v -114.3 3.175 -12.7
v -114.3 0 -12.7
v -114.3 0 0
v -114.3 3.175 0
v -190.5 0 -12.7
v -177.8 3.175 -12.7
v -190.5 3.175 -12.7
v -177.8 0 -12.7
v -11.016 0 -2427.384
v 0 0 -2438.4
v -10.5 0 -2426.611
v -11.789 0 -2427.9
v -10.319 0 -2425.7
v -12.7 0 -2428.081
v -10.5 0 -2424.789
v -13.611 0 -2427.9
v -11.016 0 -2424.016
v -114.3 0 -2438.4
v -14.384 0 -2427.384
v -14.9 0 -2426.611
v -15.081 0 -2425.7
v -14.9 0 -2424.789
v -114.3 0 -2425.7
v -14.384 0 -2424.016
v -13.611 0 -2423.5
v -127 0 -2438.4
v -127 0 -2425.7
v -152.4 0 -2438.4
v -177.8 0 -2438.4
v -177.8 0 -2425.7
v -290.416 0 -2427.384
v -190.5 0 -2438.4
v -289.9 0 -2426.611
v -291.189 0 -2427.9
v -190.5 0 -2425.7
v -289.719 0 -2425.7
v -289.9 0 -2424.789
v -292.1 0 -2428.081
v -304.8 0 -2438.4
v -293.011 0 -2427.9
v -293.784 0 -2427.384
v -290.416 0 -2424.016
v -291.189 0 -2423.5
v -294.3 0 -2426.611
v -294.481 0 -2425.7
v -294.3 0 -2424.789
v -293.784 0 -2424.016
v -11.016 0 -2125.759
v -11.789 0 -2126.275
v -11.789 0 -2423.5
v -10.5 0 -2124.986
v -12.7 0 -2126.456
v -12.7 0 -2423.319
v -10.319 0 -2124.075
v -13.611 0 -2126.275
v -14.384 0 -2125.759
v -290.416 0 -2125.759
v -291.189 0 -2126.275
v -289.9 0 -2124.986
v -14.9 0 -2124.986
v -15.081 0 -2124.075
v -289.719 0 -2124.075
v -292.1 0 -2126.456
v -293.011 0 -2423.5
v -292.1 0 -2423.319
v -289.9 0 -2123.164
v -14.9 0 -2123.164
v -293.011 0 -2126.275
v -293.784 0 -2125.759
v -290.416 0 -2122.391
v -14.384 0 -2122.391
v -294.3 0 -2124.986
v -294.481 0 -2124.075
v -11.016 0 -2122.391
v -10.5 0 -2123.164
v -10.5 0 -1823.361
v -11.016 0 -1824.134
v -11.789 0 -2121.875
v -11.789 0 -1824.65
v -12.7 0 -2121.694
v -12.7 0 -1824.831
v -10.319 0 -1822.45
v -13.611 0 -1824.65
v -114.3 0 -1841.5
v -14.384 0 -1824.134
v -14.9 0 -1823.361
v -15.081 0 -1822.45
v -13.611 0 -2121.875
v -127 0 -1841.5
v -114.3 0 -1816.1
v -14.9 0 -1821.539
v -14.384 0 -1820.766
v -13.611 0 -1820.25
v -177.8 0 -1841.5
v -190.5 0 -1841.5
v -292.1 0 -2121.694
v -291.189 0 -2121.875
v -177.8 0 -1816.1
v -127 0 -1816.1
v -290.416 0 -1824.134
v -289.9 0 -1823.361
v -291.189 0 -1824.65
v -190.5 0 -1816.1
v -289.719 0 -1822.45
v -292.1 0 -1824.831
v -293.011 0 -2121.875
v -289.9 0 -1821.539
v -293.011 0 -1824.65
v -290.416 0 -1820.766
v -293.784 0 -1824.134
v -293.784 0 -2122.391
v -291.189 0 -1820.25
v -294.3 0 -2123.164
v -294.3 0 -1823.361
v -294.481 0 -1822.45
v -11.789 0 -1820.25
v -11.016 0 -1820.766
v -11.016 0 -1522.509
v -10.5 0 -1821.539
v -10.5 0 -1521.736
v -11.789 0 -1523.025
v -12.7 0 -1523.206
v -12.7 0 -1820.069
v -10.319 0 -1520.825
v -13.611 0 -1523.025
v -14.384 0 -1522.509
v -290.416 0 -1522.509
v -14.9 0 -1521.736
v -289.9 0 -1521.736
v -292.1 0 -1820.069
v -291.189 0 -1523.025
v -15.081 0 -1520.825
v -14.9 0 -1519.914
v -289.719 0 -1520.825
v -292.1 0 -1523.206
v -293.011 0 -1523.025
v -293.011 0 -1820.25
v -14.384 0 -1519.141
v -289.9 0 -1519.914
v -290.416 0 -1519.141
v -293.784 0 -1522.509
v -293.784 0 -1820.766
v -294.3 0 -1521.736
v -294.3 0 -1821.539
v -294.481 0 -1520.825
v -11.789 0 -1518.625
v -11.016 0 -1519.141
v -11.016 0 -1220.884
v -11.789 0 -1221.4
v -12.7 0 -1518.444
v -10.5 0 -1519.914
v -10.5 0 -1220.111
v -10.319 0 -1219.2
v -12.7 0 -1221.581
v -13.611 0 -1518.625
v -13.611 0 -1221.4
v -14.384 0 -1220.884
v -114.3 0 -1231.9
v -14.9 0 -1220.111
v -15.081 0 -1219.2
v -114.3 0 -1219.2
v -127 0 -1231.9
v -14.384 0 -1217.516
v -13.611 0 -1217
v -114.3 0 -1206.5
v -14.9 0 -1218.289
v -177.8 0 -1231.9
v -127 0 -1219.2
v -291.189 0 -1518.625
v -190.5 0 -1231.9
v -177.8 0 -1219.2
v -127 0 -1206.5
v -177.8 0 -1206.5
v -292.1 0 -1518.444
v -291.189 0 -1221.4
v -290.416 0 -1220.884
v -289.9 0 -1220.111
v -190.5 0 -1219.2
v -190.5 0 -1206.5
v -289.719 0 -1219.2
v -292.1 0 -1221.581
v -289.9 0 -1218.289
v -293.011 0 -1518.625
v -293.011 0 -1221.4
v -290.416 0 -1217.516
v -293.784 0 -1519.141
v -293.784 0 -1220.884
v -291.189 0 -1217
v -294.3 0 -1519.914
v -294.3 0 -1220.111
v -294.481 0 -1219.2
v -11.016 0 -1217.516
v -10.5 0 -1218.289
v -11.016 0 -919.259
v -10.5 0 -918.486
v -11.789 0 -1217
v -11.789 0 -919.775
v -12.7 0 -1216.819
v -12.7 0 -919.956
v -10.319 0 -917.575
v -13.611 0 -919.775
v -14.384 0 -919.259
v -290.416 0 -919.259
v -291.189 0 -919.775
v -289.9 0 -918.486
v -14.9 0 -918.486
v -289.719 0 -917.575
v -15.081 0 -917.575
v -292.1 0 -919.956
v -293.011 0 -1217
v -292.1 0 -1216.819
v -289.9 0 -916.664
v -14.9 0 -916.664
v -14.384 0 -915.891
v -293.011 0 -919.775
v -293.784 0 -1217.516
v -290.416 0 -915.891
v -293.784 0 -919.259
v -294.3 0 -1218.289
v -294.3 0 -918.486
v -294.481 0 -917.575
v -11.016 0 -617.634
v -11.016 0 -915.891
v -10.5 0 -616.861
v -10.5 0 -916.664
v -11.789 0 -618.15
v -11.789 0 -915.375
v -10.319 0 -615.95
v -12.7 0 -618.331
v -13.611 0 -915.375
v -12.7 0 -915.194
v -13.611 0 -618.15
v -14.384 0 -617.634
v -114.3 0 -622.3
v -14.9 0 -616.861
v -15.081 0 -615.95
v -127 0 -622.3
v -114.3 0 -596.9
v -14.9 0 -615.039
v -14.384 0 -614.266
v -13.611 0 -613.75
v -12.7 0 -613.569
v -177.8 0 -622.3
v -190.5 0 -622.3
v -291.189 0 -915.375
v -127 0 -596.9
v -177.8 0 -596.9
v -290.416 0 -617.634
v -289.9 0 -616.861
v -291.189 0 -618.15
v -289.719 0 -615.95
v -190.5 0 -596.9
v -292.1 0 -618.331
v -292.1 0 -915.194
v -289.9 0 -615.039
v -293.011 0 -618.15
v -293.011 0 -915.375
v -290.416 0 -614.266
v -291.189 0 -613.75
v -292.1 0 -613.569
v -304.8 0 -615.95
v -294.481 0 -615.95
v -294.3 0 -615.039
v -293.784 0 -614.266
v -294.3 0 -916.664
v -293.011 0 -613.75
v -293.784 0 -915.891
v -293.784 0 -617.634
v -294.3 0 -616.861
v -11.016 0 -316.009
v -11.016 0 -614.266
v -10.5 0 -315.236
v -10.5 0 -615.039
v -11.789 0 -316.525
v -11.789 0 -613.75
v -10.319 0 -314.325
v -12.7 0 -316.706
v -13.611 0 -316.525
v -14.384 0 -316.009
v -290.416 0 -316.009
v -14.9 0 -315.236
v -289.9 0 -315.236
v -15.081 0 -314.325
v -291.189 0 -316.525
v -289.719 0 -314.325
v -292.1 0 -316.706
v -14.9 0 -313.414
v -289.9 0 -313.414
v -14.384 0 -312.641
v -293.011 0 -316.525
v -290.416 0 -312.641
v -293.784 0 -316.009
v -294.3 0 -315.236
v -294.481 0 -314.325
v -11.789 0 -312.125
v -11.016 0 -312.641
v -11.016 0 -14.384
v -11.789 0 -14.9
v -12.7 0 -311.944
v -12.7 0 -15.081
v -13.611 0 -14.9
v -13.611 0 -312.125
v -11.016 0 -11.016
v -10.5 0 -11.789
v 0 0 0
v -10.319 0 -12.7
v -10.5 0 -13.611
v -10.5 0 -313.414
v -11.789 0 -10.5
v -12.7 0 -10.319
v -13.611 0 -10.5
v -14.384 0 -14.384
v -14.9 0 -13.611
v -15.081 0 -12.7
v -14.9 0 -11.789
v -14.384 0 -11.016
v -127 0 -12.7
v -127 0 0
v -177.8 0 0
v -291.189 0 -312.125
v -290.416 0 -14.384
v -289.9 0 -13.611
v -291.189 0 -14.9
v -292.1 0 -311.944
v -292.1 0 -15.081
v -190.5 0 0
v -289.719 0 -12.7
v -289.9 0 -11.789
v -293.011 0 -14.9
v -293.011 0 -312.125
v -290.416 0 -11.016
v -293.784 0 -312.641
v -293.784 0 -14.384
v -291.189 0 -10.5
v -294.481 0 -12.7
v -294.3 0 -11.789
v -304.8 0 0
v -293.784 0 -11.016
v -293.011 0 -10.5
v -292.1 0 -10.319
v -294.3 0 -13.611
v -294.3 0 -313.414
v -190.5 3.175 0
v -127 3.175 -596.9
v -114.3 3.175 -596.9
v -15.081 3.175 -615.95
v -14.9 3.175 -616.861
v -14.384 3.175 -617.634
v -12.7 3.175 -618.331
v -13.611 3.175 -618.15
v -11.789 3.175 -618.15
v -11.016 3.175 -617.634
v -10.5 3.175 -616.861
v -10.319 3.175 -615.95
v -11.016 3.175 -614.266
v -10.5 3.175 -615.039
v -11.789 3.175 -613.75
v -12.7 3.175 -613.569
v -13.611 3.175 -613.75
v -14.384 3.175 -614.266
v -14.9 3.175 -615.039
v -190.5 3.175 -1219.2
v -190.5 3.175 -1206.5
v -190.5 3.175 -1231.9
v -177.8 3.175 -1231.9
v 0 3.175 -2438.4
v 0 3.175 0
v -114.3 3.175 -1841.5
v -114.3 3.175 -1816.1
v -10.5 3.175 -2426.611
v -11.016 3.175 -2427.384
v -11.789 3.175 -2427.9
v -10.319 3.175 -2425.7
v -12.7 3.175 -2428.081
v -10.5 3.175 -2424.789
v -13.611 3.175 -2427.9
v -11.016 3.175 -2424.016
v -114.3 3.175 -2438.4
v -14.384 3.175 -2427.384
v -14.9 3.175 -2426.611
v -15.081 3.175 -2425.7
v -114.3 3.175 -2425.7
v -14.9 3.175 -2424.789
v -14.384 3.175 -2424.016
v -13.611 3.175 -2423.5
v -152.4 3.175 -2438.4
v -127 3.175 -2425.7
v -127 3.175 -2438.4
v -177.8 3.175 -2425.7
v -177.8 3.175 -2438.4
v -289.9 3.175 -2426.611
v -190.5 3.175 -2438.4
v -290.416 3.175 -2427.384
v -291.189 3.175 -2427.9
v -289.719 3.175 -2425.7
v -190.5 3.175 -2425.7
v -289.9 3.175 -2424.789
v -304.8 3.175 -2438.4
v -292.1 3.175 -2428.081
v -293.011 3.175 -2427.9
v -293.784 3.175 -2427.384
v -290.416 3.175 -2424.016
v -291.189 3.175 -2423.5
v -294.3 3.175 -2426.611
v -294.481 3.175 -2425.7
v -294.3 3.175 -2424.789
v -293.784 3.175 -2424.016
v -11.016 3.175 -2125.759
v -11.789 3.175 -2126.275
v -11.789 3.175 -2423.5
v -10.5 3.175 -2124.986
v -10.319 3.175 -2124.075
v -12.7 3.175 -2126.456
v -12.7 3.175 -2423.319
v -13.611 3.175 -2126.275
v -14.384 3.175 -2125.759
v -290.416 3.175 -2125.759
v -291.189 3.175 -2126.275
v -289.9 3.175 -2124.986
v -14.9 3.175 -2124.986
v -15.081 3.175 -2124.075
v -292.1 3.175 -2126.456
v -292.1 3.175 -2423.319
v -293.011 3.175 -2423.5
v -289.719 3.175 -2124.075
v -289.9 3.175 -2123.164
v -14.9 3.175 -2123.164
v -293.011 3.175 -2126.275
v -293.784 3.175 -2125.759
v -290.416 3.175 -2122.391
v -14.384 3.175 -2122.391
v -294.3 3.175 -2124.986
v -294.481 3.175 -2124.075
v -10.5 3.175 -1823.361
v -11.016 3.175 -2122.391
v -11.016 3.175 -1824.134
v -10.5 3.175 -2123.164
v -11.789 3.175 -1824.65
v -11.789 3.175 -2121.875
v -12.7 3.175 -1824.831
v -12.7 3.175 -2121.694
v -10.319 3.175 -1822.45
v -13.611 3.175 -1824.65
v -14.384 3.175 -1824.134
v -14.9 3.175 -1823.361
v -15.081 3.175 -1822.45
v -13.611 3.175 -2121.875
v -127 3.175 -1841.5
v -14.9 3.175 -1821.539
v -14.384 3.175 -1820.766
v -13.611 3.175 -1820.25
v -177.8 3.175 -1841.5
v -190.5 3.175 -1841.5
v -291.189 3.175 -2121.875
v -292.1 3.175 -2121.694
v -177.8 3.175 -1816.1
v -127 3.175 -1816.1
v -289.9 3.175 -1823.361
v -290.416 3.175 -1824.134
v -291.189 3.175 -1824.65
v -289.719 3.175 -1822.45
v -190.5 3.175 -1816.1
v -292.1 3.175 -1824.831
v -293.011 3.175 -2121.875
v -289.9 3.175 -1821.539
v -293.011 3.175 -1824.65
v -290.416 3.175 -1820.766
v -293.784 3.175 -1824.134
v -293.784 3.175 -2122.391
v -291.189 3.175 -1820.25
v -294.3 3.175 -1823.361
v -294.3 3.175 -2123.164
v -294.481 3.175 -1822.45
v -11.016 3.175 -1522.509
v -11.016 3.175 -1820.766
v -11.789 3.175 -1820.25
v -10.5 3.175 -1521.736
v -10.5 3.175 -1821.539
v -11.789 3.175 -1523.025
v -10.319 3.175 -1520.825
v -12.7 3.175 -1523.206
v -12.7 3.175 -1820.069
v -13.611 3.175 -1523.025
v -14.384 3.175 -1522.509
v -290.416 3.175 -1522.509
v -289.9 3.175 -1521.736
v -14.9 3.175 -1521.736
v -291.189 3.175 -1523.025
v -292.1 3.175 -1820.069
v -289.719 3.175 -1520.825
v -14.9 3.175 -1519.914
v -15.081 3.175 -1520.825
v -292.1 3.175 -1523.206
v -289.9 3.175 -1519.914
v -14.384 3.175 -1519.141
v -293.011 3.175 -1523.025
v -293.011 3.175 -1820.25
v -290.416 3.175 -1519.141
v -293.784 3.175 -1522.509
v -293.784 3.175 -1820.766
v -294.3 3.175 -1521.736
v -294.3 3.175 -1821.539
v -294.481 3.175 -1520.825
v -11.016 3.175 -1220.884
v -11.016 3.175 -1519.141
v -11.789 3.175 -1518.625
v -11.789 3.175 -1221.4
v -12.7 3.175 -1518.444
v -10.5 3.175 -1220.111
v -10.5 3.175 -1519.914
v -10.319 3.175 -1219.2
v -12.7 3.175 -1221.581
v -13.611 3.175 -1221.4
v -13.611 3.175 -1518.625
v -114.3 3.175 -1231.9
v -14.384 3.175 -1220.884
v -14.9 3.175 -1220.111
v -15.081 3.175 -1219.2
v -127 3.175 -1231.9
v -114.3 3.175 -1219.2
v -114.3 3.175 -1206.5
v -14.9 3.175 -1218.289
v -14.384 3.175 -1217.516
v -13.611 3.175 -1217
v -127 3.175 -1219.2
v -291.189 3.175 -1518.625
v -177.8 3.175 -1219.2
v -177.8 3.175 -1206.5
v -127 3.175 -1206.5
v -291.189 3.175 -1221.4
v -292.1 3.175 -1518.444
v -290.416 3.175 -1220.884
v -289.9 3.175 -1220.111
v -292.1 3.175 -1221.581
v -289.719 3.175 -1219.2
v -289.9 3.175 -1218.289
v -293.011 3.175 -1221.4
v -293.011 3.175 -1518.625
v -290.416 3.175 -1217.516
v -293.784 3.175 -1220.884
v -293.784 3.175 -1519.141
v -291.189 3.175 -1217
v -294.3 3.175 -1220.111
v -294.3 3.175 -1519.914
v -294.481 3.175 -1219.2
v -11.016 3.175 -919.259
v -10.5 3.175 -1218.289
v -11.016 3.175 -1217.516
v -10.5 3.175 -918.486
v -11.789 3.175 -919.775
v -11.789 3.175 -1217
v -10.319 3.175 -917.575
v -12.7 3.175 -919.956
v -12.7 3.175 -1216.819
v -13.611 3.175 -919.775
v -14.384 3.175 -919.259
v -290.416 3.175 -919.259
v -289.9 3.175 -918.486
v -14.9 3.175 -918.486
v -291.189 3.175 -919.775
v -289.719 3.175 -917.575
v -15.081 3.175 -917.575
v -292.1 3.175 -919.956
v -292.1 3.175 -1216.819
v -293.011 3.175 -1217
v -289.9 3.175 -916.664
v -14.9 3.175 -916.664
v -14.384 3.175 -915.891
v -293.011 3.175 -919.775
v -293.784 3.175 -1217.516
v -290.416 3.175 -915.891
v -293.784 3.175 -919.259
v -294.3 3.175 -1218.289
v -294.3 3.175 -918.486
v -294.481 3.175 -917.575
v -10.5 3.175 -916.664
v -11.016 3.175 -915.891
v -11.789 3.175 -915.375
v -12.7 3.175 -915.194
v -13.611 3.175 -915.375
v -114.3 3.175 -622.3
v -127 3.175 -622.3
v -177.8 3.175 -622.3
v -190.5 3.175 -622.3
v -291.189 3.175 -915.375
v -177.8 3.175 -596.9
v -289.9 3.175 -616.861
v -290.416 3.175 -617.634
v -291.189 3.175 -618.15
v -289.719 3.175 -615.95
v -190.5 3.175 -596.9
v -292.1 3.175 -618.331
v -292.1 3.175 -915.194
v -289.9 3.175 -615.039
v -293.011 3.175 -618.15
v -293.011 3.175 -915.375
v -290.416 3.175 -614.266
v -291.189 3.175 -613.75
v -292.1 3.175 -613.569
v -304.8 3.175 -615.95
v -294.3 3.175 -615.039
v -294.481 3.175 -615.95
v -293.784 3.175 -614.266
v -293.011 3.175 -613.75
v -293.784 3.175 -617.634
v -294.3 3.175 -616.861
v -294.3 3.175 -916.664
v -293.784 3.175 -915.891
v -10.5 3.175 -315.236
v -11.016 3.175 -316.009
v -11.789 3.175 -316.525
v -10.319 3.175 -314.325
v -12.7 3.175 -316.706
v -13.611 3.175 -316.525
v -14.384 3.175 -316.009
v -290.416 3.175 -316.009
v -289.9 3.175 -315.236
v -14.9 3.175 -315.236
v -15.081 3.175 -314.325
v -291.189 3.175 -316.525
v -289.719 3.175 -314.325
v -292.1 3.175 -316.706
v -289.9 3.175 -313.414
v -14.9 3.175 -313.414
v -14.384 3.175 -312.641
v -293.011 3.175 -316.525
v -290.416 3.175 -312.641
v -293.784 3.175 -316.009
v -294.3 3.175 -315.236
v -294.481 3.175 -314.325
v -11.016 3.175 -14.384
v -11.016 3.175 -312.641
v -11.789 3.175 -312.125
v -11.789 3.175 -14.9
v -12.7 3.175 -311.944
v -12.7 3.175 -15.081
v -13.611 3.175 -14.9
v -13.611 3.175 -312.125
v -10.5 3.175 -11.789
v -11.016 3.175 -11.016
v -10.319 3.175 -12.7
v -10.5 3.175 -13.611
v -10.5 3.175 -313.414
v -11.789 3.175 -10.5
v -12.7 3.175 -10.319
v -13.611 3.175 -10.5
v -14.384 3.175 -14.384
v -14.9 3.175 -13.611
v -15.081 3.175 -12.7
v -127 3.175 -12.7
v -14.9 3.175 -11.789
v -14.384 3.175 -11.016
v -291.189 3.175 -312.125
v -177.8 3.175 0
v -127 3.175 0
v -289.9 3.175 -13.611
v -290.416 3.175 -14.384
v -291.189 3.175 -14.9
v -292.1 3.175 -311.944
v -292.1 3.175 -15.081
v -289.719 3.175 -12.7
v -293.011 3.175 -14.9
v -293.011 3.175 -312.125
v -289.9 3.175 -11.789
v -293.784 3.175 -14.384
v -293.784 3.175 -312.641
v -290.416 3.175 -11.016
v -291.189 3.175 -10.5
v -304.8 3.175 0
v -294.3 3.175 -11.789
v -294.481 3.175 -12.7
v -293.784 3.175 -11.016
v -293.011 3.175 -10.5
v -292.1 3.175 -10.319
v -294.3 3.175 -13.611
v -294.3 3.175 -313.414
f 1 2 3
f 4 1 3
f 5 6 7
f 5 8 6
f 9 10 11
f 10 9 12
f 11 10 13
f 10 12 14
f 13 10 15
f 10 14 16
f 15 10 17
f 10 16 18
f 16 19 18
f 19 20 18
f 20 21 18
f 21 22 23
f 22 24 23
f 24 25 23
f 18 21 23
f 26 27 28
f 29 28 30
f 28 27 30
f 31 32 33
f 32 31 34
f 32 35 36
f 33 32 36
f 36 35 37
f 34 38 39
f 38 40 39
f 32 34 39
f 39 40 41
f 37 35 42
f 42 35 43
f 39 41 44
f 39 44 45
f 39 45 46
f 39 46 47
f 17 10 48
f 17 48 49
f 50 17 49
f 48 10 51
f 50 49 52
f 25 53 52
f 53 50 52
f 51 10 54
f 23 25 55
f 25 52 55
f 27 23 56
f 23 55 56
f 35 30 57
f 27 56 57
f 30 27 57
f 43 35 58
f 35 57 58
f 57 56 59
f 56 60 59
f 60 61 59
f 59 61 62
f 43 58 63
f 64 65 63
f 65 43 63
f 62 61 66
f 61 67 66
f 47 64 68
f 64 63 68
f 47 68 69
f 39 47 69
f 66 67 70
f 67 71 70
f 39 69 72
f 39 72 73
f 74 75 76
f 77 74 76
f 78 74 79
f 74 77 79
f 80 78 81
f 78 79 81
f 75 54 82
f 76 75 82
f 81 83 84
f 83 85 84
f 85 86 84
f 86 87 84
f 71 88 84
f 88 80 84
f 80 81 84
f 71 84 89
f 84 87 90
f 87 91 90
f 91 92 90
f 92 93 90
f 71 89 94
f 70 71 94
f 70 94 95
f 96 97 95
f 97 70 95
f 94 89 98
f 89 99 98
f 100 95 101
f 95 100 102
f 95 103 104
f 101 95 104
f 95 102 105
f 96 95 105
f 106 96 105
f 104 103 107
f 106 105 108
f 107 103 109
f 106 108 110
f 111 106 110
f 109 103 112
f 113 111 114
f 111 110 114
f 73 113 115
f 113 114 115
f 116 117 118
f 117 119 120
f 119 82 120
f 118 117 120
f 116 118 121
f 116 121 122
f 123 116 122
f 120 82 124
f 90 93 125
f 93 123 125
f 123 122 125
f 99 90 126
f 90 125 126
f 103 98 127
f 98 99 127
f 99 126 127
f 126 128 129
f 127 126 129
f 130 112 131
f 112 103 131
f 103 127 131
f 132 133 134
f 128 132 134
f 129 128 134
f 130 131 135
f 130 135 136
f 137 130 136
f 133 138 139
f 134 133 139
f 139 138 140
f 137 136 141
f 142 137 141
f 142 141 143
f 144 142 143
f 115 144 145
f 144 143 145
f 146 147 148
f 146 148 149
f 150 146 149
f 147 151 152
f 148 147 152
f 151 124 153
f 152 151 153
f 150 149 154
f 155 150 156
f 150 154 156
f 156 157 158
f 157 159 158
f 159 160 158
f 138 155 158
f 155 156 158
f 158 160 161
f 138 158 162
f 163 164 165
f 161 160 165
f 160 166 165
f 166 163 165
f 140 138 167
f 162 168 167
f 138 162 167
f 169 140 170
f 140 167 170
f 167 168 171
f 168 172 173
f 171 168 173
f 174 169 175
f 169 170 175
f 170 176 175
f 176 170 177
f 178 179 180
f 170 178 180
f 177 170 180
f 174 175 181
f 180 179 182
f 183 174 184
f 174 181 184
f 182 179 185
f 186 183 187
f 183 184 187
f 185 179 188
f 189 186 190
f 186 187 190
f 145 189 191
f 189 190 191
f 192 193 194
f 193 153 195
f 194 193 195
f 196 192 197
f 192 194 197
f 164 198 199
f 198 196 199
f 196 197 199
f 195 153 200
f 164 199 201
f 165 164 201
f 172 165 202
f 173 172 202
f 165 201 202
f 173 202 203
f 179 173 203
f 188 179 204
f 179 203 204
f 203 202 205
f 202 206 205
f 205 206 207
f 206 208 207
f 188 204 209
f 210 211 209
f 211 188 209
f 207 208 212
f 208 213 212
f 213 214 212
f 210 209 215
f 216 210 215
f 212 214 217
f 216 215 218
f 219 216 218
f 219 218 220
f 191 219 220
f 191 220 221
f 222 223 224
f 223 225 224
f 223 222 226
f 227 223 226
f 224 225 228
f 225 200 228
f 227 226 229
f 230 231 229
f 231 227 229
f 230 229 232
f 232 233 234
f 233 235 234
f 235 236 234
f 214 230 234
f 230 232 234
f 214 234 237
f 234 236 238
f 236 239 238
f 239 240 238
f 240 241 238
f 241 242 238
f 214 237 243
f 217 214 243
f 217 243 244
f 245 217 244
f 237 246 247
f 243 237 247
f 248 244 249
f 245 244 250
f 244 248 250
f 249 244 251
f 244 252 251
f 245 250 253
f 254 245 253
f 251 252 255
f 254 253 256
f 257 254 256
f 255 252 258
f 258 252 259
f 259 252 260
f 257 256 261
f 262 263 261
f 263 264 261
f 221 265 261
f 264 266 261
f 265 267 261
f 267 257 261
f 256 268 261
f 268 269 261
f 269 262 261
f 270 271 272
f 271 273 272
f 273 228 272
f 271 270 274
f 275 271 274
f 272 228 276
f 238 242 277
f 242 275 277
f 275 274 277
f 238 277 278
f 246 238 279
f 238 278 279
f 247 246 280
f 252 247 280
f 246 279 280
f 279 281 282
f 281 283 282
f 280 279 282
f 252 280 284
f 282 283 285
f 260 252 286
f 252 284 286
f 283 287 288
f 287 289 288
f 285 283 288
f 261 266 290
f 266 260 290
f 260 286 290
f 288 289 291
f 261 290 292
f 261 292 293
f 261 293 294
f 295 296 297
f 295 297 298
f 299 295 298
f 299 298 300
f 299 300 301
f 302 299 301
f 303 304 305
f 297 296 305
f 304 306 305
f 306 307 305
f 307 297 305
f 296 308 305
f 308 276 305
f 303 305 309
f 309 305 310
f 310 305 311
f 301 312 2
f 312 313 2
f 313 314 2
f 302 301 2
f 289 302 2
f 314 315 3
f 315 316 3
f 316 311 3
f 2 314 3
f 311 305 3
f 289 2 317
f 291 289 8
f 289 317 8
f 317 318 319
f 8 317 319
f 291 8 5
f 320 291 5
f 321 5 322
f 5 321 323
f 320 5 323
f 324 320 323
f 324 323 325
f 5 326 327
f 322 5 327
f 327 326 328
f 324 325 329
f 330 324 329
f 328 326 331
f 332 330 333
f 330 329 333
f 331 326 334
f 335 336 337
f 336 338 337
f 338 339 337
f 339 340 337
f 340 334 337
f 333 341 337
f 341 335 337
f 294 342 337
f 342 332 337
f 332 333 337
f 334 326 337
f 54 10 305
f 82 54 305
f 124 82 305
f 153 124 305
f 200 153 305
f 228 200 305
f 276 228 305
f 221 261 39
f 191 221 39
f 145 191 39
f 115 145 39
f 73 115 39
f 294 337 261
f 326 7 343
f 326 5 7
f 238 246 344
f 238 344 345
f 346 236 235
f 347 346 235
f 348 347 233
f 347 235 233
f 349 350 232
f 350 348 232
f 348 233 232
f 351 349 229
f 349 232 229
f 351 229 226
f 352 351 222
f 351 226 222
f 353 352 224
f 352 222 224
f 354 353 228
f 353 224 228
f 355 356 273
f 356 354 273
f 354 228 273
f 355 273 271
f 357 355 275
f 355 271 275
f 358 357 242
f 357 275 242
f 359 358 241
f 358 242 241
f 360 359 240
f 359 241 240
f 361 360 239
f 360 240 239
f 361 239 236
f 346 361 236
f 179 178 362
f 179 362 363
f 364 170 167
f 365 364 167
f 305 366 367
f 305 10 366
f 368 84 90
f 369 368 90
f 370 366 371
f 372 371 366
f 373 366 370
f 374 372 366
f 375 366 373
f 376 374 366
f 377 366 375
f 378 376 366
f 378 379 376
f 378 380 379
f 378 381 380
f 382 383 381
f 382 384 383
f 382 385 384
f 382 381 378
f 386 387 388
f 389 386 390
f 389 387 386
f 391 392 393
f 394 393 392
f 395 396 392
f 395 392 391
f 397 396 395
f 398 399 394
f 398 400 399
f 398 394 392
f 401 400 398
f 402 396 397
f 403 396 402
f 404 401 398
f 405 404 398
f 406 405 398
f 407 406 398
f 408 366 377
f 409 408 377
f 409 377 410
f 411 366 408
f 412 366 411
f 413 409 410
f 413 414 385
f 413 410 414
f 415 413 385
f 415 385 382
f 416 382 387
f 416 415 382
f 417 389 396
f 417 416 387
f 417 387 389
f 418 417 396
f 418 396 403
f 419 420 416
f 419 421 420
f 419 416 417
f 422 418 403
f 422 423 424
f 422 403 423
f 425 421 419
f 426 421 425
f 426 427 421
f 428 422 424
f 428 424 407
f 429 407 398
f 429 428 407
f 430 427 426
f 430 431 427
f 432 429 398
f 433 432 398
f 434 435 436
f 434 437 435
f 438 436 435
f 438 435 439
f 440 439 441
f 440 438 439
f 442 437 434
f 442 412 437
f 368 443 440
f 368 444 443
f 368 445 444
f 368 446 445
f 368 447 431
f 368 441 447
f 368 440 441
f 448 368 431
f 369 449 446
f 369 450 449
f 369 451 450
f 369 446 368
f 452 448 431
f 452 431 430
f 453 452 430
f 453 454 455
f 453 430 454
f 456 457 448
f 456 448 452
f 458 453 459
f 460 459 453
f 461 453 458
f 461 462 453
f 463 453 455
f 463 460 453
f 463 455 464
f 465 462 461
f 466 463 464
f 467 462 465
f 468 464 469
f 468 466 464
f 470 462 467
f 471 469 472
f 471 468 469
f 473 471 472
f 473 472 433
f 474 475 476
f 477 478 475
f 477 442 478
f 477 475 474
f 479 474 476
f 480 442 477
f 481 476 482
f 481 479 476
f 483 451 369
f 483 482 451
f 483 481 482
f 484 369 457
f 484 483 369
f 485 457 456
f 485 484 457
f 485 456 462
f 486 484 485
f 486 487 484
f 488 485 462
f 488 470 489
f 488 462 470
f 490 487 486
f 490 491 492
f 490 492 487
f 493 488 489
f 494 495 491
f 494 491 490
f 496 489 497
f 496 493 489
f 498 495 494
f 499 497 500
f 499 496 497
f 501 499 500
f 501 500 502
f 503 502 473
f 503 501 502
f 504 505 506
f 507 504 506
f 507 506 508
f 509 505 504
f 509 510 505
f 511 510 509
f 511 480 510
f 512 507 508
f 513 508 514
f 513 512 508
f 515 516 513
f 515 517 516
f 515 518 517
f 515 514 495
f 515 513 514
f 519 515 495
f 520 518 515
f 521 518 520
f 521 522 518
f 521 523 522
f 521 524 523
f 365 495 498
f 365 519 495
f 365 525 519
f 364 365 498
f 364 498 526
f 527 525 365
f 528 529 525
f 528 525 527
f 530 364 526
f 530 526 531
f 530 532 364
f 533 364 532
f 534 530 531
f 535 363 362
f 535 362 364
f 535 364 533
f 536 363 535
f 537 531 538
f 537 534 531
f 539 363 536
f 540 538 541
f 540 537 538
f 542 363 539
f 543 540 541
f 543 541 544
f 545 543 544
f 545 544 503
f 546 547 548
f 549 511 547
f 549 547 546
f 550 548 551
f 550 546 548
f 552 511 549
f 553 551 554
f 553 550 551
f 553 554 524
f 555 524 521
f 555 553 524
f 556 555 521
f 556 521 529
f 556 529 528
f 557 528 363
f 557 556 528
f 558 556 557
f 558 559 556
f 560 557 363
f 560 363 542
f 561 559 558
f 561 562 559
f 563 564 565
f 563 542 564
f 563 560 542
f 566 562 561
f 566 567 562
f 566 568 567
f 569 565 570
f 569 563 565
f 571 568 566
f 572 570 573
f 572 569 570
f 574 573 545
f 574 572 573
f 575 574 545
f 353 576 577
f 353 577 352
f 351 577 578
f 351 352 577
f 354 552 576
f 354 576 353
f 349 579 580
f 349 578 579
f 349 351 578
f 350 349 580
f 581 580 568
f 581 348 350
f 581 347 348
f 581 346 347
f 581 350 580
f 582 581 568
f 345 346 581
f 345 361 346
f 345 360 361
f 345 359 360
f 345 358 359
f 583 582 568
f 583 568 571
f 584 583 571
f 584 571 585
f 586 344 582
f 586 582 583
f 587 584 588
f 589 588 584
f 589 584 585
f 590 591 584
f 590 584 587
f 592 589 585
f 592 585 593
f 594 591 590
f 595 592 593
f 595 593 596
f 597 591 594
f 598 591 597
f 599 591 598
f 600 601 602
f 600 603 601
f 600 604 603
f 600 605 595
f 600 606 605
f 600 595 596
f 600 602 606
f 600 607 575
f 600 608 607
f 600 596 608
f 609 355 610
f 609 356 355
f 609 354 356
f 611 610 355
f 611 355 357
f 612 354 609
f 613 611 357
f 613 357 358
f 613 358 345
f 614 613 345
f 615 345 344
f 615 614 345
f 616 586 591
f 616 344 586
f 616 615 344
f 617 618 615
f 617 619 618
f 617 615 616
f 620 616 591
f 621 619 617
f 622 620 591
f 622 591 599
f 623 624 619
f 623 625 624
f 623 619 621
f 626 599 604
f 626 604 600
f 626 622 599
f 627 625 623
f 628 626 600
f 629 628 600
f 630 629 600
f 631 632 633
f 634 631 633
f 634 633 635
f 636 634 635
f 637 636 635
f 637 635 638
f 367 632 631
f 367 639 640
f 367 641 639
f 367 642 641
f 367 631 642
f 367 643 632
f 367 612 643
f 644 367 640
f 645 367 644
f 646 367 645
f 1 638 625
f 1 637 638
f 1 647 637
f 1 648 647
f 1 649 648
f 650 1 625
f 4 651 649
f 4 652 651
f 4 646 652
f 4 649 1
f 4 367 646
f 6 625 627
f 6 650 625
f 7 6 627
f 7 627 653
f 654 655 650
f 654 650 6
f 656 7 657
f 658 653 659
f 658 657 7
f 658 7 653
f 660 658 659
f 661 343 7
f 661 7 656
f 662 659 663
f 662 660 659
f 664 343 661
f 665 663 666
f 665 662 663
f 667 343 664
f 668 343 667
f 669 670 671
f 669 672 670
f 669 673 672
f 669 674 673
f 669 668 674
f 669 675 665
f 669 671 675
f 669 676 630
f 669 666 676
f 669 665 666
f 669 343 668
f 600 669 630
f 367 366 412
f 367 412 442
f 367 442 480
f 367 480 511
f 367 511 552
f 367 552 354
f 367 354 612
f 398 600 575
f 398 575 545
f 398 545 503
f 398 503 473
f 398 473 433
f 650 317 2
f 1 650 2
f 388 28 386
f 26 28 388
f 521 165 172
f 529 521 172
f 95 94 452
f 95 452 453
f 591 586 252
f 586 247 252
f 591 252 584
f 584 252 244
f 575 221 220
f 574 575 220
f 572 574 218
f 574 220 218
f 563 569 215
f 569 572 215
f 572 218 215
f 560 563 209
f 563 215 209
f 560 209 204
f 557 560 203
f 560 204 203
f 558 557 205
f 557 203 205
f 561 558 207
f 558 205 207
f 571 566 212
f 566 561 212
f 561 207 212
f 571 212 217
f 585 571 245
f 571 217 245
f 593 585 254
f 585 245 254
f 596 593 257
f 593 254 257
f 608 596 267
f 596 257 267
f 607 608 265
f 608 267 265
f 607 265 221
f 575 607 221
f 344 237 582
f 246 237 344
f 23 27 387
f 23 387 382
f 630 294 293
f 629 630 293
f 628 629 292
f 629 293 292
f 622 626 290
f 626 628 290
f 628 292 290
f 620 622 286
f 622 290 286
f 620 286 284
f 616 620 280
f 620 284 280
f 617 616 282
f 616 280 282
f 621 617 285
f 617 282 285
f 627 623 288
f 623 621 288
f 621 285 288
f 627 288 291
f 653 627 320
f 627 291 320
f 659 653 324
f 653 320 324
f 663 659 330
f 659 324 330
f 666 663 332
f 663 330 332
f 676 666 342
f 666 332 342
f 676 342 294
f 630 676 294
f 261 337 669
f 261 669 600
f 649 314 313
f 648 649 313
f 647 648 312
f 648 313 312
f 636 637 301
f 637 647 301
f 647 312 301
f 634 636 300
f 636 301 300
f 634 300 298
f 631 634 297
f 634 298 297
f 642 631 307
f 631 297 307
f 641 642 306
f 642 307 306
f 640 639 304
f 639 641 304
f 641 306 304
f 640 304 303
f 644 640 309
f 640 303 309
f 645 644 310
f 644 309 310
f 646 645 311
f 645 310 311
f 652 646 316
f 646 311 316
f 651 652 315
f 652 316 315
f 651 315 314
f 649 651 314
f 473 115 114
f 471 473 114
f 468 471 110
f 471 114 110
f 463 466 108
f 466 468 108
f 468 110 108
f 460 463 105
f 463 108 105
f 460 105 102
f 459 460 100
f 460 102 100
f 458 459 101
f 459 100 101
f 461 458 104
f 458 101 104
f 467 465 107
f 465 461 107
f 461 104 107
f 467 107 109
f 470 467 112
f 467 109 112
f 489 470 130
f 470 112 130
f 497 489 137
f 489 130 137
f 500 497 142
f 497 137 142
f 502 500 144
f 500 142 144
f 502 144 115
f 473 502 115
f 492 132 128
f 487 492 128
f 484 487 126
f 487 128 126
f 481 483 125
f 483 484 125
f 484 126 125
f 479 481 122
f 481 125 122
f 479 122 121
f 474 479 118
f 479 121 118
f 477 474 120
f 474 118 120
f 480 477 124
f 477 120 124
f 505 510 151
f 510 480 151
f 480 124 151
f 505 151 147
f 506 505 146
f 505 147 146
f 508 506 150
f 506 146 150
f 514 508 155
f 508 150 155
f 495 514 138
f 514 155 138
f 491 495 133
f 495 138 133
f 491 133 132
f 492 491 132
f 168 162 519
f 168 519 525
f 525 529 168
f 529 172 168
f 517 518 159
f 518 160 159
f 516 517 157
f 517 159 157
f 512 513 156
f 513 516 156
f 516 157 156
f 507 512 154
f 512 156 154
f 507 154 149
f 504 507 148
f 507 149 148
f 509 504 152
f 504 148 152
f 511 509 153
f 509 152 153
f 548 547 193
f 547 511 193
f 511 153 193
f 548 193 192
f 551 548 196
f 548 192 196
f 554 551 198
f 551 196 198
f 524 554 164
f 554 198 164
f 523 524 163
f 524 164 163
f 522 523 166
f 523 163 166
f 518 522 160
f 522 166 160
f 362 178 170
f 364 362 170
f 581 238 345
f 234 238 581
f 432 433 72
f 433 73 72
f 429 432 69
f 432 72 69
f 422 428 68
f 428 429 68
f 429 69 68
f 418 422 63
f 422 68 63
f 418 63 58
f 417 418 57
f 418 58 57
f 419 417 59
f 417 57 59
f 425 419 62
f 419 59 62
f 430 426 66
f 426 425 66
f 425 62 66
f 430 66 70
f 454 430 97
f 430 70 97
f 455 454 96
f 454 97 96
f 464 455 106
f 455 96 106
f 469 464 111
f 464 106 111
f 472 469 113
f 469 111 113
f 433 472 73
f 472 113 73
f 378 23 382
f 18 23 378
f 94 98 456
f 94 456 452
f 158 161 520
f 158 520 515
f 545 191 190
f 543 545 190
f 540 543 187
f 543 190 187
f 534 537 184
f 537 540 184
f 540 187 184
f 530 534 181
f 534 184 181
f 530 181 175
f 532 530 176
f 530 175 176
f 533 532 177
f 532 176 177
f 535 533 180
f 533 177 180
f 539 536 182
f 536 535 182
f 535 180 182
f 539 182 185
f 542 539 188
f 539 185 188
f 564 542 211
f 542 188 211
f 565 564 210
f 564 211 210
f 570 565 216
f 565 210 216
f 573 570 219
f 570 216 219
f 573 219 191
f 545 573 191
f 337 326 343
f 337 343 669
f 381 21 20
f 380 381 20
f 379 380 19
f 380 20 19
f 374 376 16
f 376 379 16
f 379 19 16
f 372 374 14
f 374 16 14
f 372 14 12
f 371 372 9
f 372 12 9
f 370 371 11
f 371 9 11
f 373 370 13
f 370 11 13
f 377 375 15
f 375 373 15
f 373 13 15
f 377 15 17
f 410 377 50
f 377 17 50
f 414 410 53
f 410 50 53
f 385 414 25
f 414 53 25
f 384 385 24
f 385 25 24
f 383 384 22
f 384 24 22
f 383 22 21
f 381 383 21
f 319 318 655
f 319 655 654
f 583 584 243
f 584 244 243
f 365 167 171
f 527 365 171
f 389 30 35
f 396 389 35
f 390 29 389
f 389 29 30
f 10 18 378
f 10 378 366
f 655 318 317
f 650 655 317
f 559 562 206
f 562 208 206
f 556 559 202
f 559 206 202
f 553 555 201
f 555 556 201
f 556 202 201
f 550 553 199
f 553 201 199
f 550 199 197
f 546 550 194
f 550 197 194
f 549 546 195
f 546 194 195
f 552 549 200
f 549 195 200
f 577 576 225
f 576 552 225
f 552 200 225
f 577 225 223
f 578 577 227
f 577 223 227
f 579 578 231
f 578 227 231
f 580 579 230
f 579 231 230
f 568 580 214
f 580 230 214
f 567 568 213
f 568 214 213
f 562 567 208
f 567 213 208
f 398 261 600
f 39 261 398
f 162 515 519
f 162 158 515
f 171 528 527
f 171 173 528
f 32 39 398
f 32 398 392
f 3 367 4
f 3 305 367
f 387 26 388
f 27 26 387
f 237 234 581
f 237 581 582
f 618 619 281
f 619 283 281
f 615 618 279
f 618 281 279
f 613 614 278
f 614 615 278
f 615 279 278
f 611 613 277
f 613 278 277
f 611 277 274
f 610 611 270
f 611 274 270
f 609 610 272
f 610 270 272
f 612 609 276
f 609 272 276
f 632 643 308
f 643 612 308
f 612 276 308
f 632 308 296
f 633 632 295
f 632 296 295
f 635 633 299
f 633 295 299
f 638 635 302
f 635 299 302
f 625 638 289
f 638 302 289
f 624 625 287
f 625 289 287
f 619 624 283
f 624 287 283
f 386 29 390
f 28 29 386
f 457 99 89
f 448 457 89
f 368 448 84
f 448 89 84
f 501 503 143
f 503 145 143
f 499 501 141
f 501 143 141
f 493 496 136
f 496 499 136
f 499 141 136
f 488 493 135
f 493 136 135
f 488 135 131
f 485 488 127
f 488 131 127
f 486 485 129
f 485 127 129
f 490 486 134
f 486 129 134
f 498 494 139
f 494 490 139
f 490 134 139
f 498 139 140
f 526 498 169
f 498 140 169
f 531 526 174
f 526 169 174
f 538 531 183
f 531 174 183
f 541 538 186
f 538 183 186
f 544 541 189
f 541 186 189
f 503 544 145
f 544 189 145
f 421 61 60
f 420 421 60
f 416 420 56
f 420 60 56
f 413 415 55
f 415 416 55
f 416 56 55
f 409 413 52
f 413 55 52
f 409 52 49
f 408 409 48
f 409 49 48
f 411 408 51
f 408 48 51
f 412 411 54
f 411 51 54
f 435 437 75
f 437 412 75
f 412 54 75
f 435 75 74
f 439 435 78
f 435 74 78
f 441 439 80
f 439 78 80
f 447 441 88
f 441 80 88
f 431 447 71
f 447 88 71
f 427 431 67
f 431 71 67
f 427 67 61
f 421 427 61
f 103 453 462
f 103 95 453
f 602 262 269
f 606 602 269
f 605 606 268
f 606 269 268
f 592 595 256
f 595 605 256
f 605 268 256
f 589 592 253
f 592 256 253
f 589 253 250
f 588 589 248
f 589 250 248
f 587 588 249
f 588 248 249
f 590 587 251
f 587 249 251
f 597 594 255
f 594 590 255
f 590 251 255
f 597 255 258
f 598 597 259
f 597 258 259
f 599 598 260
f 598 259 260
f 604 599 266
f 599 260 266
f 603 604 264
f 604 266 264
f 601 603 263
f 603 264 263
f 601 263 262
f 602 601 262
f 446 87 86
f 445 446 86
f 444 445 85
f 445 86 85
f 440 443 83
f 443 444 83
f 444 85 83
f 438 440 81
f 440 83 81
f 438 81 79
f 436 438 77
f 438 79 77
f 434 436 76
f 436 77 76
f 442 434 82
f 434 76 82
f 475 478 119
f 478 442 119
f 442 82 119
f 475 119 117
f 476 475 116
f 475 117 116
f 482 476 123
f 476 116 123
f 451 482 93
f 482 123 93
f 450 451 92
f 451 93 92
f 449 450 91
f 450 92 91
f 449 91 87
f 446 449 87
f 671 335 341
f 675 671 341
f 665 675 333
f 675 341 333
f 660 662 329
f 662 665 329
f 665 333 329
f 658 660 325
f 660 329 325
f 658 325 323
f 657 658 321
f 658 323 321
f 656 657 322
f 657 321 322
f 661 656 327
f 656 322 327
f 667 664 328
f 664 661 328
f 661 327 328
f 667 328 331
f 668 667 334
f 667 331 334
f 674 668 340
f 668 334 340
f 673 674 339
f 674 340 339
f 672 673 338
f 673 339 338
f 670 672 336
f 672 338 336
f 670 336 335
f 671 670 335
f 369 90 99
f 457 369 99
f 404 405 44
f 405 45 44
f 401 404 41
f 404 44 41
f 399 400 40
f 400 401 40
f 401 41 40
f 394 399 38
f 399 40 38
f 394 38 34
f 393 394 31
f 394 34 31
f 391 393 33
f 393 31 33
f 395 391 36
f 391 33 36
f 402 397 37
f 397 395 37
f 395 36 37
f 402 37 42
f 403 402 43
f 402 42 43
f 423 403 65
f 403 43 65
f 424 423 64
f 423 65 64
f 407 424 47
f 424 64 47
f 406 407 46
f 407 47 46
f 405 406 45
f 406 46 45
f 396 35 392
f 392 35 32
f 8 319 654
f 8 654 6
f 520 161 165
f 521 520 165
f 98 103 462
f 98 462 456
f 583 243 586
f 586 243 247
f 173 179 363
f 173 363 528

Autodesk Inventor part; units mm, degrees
ref_plane "YZ Plane" through (0, 0, 0) normal (1, 0, 0) x (0, 1, 0)
ref_plane "XZ Plane" through (0, 0, 0) normal (0, 1, 0) x (-1, 0, 0)
ref_plane "XY Plane" through (0, 0, 0) normal (0, 0, 1) x (1, 0, 0)
sketch "Sketch1" plane through (0, 0, 0) normal (0, 1, 0) x (-1, 0, 0)
  line L0 (0, 0) -> (304.8, 0)
  line L1 (304.8, 0) -> (304.8, -2438.4)
  line L2 (304.8, -2438.4) -> (0, -2438.4)
  line L3 (0, -2438.4) -> (0, 0)
  line L4 (114.3, 0) -> (127, 0)
  line L5 (127, 0) -> (127, -12.7)
  line L6 (127, -12.7) -> (114.3, -12.7)
  line L7 (114.3, -12.7) -> (114.3, 0)
  line L8 (152.4, -2438.4) -> (152.4, -2413)
  line L9 (127, -1219.2) -> (114.3, -1219.2)
  line L10 (114.3, -1219.2) -> (114.3, -1206.5)
  line L11 (114.3, -1206.5) -> (127, -1206.5)
  line L12 (127, -1206.5) -> (127, -1219.2)
  line L13 (114.3, -2438.4) -> (127, -2438.4)
  line L14 (127, -2438.4) -> (127, -2425.7)
  line L15 (127, -2425.7) -> (114.3, -2425.7)
  line L16 (114.3, -2425.7) -> (114.3, -2438.4)
  line L17 (114.3, -1219.2) -> (114.3, -1231.9)
  line L18 (114.3, -1231.9) -> (127, -1231.9)
  line L19 (127, -1231.9) -> (127, -1219.2)
  line L20 (190.5, 0) -> (177.8, 0)
  line L21 (177.8, 0) -> (177.8, -12.7)
  line L22 (177.8, -12.7) -> (190.5, -12.7)
  line L23 (190.5, -12.7) -> (190.5, 0)
  line L24 (177.8, -1219.2) -> (190.5, -1219.2)
  line L25 (190.5, -1219.2) -> (190.5, -1206.5)
  line L26 (190.5, -1206.5) -> (177.8, -1206.5)
  line L27 (177.8, -1206.5) -> (177.8, -1219.2)
  line L28 (190.5, -1231.9) -> (177.8, -1231.9)
  line L29 (190.5, -1219.2) -> (190.5, -1231.9)
  line L30 (177.8, -1231.9) -> (177.8, -1219.2)
  line L31 (177.8, -2425.7) -> (190.5, -2425.7)
  line L32 (190.5, -2438.4) -> (177.8, -2438.4)
  line L33 (177.8, -2438.4) -> (177.8, -2425.7)
  line L34 (190.5, -2425.7) -> (190.5, -2438.4)
  line L35 (127, -596.9) -> (114.3, -596.9)
  line L36 (114.3, -596.9) -> (114.3, -622.3)
  line L37 (114.3, -622.3) -> (127, -622.3)
  line L38 (127, -622.3) -> (127, -596.9)
  line L39 (127, -1841.5) -> (114.3, -1841.5)
  line L40 (114.3, -1841.5) -> (114.3, -1816.1)
  line L41 (114.3, -1816.1) -> (127, -1816.1)
  line L42 (127, -1816.1) -> (127, -1841.5)
  line L43 (177.8, -596.9) -> (190.5, -596.9)
  line L44 (190.5, -596.9) -> (190.5, -622.3)
  line L45 (190.5, -622.3) -> (177.8, -622.3)
  line L46 (177.8, -622.3) -> (177.8, -596.9)
  line L47 (177.8, -1841.5) -> (190.5, -1841.5)
  line L48 (177.8, -1816.1) -> (177.8, -1841.5)
  line L49 (190.5, -1816.1) -> (177.8, -1816.1)
  line L50 (190.5, -1841.5) -> (190.5, -1816.1)
  circle A0 centre (292.1, -12.7) radius 2.3812
  circle A1 centre (292.1, -314.325) radius 2.3813
  circle A2 centre (292.1, -615.95) radius 2.3813
  line L51 (304.8, -615.95) -> (300.4096, -615.95)
  circle A3 centre (292.1, -1219.2) radius 2.3812
  circle A4 centre (292.1, -917.575) radius 2.3813
  circle A5 centre (292.1, -2425.7) radius 2.3812
  circle A6 centre (292.1, -1822.45) radius 2.3813
  circle A7 centre (292.1, -1520.825) radius 2.3813
  circle A8 centre (292.1, -2124.075) radius 2.3813
  circle A9 centre (12.7, -12.7) radius 2.3812
  circle A10 centre (12.7, -314.325) radius 2.3813
  circle A11 centre (12.7, -615.95) radius 2.3813
  circle A12 centre (12.7, -1219.2) radius 2.3812
  circle A13 centre (12.7, -917.575) radius 2.3813
  circle A14 centre (12.7, -1520.825) radius 2.3813
  circle A15 centre (12.7, -1822.45) radius 2.3813
  circle A16 centre (12.7, -2425.7) radius 2.3812
  circle A17 centre (12.7, -2124.075) radius 2.3813
  point P0 (190.5, 0)
  point P1 (127, 0)
  point P2 (114.3, -2438.4)
  point P3 (127, -2438.4)
  dimension "d0" = 304.8
  dimension "d1" = 2438.4
  dimension "d4" = 12.7
  dimension "d5" = 12.7
  dimension "d6" = 114.3
  dimension "d7" = 25.4
  dimension "d8" = 12.7
  dimension "d9" = 12.7
  dimension "d10" = 114.3
  dimension "d11" = 1219.2
  dimension "d12" = 12.7
  dimension "d13" = 25.4
  dimension "d14" = 114.3
  dimension "d15" = 596.9
  dimension "d16" = 4.7625
  dimension "d17" = 12.7
  dimension "d18" = 12.7
  dimension "d19" = 4.7625
  dimension "d20" = 314.325
  dimension "d21" = 0
  dimension "d22" = 4.7625
  dimension "d23" = 0
  dimension "d24" = 615.95
extrude "Extrusion1" add sketch "Sketch1" along normal blind 3.175 contours L0 L7 L6 L5 L21 L22 L23 L1 L2 L34 L31 L33 L14 L15 L16 L3
properties part number "Plate1ftx8ft"
